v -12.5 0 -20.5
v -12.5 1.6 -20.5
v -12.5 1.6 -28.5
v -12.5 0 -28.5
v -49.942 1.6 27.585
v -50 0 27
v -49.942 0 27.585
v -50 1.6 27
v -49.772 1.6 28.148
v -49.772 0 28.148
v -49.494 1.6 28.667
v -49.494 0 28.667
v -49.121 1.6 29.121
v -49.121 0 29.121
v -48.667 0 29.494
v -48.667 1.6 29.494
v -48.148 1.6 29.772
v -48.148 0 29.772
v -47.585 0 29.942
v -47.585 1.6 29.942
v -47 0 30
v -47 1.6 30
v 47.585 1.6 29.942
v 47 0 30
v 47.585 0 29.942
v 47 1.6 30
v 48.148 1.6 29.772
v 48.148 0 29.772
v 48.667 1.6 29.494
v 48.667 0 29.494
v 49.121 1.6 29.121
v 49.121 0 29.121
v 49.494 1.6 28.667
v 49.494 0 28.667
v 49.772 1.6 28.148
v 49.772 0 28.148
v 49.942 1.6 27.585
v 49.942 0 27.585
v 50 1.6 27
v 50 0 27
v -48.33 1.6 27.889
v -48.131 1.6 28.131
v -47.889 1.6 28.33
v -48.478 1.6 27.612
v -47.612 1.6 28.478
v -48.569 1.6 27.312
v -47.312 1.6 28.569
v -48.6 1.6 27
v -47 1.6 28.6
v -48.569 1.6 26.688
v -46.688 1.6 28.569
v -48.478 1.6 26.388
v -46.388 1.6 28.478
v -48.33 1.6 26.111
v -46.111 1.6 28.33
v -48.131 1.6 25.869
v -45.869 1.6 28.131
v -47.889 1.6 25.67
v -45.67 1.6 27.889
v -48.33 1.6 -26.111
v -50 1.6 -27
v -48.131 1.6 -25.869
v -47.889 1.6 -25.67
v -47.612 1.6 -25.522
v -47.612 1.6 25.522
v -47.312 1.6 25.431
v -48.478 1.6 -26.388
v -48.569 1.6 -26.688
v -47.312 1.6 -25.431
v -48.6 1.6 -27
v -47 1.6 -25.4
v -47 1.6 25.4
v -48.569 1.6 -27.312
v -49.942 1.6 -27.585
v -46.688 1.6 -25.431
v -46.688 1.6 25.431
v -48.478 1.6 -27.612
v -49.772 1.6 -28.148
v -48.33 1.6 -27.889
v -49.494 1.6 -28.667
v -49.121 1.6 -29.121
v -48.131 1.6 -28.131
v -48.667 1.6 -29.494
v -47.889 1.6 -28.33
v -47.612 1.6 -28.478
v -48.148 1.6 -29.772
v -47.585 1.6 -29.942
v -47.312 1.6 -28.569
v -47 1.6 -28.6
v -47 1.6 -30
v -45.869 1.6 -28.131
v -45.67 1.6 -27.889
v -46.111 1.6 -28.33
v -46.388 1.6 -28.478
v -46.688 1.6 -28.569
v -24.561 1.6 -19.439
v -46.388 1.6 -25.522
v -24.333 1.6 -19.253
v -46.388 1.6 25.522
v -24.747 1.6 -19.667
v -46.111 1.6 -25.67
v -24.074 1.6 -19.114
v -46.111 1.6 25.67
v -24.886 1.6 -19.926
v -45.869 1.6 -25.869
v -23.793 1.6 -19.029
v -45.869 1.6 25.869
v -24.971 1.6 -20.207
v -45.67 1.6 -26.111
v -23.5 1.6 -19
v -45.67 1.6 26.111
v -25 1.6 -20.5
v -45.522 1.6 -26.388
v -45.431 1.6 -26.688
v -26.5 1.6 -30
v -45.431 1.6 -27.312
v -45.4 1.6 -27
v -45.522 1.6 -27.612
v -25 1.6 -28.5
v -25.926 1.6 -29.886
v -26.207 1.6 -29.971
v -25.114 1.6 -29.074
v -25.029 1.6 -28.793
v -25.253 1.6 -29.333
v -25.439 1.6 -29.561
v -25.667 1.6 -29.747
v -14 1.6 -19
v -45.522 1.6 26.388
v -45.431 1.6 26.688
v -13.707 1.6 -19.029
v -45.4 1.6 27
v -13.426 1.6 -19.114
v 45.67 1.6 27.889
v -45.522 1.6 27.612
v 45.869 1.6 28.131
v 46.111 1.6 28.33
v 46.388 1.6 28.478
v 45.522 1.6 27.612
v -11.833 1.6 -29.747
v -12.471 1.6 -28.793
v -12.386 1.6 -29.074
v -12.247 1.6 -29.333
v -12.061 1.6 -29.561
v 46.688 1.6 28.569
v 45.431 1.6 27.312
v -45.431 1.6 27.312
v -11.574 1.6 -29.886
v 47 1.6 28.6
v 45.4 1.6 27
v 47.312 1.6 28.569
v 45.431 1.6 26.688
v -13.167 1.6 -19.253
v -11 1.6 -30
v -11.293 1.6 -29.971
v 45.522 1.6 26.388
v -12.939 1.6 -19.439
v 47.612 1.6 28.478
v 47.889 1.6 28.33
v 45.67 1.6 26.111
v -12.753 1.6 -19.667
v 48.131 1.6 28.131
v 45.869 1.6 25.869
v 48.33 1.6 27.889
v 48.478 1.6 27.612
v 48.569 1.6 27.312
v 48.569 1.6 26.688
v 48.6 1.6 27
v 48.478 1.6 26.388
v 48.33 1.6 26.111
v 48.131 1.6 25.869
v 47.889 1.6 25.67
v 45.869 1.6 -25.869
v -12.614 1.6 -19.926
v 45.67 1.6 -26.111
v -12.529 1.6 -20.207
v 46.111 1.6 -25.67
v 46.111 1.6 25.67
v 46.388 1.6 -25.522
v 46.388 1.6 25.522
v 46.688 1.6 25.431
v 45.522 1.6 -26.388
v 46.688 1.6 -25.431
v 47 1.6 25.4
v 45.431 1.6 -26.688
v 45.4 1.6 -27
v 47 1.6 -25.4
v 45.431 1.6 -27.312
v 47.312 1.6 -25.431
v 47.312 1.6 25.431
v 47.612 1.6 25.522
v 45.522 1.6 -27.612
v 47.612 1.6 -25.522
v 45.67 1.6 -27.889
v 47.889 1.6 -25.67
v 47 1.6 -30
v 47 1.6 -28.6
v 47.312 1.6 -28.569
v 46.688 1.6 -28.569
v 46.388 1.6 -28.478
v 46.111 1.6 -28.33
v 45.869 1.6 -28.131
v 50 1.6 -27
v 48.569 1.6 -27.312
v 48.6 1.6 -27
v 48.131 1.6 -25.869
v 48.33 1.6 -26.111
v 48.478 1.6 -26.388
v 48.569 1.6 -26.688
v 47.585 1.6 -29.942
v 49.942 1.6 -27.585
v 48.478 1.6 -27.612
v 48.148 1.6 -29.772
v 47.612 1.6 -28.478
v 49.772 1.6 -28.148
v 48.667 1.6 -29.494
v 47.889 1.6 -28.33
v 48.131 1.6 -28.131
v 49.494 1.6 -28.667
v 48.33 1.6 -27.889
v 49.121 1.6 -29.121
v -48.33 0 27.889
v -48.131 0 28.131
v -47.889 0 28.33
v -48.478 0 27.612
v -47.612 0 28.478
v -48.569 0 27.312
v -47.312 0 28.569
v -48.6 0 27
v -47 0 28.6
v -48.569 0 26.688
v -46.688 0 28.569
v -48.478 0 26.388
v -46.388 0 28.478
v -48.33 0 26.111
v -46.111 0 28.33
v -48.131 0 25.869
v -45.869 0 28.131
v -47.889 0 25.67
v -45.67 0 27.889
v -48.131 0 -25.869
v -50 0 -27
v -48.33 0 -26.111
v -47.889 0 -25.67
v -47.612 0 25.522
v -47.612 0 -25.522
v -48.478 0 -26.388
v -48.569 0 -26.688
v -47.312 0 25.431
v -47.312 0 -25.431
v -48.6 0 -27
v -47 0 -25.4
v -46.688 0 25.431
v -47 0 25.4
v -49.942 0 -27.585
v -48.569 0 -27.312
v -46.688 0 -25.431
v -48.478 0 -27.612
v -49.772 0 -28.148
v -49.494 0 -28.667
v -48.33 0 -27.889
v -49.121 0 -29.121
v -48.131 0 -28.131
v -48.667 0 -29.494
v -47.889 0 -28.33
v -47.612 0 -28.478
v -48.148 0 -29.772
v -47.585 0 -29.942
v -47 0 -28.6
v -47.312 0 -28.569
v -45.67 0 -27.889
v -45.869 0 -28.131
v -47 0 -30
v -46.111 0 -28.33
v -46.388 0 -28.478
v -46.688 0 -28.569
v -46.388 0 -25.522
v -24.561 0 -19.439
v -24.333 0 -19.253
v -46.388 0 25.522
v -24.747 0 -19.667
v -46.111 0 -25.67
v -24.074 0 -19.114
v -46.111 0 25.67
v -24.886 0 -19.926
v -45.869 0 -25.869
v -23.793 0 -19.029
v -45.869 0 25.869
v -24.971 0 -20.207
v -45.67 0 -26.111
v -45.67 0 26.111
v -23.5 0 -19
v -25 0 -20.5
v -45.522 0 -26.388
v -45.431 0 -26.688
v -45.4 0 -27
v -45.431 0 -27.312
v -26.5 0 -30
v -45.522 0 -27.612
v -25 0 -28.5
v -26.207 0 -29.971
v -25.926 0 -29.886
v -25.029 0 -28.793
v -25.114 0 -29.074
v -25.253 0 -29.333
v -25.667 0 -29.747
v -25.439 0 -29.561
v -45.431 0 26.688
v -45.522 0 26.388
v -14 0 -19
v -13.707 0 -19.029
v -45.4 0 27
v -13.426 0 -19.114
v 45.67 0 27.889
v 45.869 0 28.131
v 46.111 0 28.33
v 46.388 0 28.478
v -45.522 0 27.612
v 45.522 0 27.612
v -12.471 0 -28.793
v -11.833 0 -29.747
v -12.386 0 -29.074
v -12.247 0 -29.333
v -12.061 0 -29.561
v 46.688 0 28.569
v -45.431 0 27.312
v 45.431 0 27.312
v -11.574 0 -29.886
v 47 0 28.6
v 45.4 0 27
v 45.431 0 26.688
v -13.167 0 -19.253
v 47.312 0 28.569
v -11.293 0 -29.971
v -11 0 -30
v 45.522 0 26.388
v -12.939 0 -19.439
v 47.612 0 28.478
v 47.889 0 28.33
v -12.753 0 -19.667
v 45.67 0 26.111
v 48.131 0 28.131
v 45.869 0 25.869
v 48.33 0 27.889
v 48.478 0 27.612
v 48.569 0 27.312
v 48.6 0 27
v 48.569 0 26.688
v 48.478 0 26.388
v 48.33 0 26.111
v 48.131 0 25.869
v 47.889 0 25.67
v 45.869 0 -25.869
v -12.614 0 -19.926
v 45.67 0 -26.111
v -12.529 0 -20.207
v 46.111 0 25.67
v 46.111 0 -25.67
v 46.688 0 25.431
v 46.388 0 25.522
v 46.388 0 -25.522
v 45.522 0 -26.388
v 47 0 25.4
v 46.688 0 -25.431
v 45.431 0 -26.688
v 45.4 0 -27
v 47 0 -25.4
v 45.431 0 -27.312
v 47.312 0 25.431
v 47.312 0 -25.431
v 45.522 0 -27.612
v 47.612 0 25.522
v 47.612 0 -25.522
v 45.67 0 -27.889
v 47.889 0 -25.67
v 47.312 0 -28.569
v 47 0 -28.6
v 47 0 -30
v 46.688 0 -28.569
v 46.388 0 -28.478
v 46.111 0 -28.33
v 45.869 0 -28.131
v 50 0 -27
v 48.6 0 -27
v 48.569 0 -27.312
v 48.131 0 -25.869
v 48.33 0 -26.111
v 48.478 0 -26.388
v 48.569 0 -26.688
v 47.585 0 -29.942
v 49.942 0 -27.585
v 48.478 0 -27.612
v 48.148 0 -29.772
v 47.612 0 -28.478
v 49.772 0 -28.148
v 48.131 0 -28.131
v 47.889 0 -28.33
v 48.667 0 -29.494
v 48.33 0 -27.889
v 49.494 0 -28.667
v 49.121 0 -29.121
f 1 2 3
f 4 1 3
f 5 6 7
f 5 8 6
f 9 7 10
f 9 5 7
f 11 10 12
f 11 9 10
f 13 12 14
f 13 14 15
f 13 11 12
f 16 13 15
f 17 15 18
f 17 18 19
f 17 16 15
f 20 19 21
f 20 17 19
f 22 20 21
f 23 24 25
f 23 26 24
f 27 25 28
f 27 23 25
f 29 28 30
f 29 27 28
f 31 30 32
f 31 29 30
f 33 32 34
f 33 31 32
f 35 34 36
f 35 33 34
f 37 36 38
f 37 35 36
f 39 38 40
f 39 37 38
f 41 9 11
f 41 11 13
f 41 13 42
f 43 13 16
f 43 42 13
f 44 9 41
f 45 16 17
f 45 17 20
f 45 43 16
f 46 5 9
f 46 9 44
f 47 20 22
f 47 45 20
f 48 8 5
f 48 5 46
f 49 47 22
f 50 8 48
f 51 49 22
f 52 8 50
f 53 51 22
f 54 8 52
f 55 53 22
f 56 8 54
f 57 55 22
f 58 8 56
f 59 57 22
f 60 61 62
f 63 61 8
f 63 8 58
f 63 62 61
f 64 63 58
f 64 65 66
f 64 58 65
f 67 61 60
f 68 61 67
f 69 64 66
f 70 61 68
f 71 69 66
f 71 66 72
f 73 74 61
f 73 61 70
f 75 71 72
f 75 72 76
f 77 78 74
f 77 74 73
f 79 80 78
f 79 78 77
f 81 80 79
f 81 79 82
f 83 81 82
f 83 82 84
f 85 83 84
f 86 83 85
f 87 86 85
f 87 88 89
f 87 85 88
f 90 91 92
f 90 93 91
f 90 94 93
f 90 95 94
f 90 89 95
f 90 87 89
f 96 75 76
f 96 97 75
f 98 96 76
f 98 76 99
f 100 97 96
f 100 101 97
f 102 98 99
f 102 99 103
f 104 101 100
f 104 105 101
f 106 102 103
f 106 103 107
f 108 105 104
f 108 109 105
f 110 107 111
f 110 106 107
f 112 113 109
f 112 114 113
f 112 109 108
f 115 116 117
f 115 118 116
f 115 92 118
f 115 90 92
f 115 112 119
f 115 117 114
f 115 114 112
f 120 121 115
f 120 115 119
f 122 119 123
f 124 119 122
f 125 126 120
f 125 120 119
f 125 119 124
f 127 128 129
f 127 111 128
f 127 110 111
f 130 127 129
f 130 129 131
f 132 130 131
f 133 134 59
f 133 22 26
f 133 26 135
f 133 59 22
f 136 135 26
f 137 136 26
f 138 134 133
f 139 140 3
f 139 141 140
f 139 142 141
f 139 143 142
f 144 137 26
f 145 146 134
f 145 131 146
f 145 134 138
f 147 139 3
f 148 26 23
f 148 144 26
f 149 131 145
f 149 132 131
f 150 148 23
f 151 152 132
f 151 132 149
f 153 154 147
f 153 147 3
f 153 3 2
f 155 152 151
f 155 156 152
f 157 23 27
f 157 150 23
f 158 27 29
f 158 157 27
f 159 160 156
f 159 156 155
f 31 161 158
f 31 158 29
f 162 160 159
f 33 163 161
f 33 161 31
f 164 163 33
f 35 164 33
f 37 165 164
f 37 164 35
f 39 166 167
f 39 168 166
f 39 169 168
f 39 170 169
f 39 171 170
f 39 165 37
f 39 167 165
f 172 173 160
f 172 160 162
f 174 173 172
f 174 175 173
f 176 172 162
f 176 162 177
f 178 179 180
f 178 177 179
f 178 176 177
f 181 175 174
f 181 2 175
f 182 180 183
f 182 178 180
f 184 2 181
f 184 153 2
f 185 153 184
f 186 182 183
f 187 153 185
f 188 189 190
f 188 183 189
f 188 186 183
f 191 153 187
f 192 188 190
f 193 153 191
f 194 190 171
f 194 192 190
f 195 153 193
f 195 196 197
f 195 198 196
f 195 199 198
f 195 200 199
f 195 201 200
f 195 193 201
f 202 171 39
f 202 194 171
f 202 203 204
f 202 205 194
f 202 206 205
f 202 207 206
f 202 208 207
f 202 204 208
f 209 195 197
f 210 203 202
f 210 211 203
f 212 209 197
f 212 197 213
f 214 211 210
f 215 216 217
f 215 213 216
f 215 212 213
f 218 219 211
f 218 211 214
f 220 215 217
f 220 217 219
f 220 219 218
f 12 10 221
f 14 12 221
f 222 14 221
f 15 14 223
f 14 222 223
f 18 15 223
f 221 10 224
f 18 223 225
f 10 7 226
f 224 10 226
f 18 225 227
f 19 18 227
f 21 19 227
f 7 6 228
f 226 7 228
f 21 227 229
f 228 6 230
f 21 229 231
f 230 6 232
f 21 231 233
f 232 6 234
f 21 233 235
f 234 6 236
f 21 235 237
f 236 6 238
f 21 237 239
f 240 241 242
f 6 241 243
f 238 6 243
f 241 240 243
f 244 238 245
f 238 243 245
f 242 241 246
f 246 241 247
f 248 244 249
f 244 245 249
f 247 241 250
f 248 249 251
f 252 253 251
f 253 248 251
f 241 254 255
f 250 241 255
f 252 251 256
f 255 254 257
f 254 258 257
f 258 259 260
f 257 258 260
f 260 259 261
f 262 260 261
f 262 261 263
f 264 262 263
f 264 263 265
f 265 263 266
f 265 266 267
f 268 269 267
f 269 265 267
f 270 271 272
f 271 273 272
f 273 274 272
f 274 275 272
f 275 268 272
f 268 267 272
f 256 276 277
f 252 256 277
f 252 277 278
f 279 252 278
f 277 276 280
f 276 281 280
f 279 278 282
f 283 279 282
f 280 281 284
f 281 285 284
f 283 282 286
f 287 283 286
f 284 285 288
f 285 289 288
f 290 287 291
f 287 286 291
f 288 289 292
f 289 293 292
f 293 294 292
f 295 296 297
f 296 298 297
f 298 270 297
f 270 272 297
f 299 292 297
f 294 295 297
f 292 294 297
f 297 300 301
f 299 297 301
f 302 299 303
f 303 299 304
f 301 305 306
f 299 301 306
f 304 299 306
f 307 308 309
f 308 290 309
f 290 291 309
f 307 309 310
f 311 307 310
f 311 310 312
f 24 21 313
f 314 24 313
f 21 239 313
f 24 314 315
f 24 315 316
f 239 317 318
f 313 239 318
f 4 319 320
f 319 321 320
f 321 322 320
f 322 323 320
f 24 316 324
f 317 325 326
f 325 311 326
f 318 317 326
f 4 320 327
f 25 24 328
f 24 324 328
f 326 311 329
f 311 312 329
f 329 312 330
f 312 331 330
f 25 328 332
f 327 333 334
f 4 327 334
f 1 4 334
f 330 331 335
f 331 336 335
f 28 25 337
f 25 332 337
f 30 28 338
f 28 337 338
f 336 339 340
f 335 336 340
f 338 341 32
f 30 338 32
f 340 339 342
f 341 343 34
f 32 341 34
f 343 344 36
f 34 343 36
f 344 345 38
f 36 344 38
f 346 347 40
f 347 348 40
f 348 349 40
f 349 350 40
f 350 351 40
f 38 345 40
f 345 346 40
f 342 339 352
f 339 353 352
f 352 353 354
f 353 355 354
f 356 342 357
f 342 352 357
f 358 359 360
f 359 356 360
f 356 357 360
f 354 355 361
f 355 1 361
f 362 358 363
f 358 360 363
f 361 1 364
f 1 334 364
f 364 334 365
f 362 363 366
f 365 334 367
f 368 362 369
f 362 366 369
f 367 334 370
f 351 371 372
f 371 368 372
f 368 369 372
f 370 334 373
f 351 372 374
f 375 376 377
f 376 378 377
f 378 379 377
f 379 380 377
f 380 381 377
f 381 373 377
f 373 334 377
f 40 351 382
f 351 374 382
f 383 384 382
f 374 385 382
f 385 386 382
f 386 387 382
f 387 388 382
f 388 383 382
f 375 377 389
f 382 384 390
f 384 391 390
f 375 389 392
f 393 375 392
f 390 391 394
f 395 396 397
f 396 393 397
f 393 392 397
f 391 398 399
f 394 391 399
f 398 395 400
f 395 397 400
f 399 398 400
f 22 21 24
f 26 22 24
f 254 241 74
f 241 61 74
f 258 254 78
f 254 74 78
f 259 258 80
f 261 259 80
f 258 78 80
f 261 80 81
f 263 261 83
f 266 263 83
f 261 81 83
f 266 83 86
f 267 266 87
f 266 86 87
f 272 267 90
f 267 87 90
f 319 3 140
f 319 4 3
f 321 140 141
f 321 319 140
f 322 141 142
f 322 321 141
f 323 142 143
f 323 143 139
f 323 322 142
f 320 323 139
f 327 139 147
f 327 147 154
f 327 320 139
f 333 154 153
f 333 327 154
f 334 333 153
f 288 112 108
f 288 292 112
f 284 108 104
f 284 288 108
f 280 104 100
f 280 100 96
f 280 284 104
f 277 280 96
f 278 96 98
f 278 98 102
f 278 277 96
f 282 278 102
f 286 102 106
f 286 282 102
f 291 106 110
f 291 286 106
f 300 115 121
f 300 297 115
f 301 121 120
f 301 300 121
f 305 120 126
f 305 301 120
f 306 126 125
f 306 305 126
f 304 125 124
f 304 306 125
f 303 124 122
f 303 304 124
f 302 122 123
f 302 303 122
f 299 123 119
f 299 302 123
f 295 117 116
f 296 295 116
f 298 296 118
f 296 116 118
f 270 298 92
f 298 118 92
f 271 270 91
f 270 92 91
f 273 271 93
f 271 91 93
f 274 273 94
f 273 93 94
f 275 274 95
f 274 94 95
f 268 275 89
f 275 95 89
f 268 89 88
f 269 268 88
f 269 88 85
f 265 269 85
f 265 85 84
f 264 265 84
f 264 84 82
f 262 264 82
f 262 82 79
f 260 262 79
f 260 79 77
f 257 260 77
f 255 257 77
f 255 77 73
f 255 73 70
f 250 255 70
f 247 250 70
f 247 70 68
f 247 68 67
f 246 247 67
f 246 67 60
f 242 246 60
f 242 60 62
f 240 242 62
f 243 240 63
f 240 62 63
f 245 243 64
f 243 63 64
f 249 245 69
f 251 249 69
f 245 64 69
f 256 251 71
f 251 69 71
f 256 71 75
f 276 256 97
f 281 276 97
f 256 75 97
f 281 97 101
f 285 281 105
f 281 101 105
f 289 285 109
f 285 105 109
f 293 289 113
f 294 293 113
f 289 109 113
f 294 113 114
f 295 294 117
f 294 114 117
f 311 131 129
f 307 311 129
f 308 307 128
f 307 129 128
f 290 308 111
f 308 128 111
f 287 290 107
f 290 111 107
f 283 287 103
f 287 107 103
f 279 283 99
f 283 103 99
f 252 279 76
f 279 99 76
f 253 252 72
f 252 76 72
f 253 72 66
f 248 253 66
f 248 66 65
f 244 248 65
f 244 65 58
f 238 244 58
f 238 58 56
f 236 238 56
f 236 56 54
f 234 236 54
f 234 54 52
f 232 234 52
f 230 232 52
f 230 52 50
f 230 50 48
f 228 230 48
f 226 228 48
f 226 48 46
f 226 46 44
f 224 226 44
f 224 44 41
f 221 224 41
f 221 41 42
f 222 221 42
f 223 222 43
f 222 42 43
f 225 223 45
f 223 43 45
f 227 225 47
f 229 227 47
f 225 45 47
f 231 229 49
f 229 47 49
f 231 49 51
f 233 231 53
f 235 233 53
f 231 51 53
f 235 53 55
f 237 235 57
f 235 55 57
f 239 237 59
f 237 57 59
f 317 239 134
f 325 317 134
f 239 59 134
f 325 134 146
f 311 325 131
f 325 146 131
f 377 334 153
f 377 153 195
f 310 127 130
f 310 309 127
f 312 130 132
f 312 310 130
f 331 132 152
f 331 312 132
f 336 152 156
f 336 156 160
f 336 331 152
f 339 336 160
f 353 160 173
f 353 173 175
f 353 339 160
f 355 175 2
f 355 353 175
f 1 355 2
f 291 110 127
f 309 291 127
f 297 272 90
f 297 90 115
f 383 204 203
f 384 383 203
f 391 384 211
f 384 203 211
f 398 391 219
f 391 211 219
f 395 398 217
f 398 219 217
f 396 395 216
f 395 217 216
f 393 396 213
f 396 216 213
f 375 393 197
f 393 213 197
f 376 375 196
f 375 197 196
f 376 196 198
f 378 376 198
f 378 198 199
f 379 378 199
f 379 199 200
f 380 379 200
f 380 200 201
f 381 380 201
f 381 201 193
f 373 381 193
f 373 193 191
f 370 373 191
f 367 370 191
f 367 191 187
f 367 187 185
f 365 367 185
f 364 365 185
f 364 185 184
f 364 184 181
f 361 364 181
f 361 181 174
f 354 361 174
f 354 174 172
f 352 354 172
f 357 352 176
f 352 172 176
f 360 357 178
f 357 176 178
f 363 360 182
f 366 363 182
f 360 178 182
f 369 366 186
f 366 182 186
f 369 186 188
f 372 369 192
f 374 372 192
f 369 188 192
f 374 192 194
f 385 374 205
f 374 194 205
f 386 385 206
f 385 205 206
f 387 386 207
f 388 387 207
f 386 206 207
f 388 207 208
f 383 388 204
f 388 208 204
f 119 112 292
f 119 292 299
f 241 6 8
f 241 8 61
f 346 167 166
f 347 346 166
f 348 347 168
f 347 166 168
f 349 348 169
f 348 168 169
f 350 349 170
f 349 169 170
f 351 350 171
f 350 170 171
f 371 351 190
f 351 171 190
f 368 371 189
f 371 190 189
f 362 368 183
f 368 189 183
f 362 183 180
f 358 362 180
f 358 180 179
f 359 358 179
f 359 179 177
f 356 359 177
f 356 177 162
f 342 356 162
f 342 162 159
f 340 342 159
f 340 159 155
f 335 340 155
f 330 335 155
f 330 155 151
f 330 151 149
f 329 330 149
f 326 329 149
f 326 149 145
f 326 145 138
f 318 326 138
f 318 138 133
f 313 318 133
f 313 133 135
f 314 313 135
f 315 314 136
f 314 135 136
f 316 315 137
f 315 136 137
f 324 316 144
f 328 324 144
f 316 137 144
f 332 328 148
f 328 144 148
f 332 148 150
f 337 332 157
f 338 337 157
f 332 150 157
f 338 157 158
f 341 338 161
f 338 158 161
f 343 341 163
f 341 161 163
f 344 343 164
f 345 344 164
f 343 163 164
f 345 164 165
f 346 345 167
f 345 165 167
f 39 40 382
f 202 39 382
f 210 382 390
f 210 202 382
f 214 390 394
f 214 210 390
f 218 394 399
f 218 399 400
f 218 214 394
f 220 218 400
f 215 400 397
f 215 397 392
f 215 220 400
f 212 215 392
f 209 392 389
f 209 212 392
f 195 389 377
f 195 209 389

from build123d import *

# Parameters (mm, degrees)
SKETCH_1_W          = 100
SKETCH_1_H          = 60
EXTRUDE_1_DEPTH     = 1.6
SKETCH_2_R          = 1.6
CUT_EXTRUDE_1_DEPTH = 2.6
SKETCH_3_W          = 12.5
SKETCH_3_H          = 11
CUT_EXTRUDE_2_DEPTH = 2.6
FILLET_1_R          = 3
FILLET_2_R          = 1.5


with BuildPart() as part:
    # 草图1 → 凸台-拉伸1 (new body)
    with BuildSketch(Plane(origin=(0, 0, 0), x_dir=(1, 0, 0), z_dir=(0, 1, 0))):
        Rectangle(SKETCH_1_W, SKETCH_1_H)
    extrude(amount=EXTRUDE_1_DEPTH)

    # 草图2 → 切除-拉伸1 (cut, through all)
    with BuildSketch(Plane(origin=(0, 1.6, 0), x_dir=(1, 0, 0), z_dir=(0, 1, 0))):
        with Locations((-47, 27)):
            Circle(SKETCH_2_R)
        with Locations((47, 27)):
            Circle(SKETCH_2_R)
        with Locations((47, -27)):
            Circle(SKETCH_2_R)
        with Locations((-47, -27)):
            Circle(SKETCH_2_R)
    extrude(amount=-CUT_EXTRUDE_1_DEPTH, mode=Mode.SUBTRACT)

    # 草图3 → 切除-拉伸2 (cut, through all)
    with BuildSketch(Plane(origin=(0, 1.6, 0), x_dir=(1, 0, 0), z_dir=(0, 1, 0))):
        with Locations((-18.75, 24.5)):
            Rectangle(SKETCH_3_W, SKETCH_3_H)
    extrude(amount=-CUT_EXTRUDE_2_DEPTH, mode=Mode.SUBTRACT)

    # 圆角1
    fillet_1_edges = [part.edges().sort_by_distance(p)[0] for p in [
        (-50, 0.8, 30),
        (-50, 0.8, -30),
        (50, 0.8, -30),
        (50, 0.8, 30),
    ]]
    fillet(fillet_1_edges, radius=FILLET_1_R)

    # 圆角2
    fillet_2_edges = [part.edges().sort_by_distance(p)[0] for p in [
        (-25, 0.8, -19),
        (-25, 0.8, -30),
        (-12.5, 0.8, -30),
        (-12.5, 0.8, -19),
    ]]
    fillet(fillet_2_edges, radius=FILLET_2_R)


solid = part.part
